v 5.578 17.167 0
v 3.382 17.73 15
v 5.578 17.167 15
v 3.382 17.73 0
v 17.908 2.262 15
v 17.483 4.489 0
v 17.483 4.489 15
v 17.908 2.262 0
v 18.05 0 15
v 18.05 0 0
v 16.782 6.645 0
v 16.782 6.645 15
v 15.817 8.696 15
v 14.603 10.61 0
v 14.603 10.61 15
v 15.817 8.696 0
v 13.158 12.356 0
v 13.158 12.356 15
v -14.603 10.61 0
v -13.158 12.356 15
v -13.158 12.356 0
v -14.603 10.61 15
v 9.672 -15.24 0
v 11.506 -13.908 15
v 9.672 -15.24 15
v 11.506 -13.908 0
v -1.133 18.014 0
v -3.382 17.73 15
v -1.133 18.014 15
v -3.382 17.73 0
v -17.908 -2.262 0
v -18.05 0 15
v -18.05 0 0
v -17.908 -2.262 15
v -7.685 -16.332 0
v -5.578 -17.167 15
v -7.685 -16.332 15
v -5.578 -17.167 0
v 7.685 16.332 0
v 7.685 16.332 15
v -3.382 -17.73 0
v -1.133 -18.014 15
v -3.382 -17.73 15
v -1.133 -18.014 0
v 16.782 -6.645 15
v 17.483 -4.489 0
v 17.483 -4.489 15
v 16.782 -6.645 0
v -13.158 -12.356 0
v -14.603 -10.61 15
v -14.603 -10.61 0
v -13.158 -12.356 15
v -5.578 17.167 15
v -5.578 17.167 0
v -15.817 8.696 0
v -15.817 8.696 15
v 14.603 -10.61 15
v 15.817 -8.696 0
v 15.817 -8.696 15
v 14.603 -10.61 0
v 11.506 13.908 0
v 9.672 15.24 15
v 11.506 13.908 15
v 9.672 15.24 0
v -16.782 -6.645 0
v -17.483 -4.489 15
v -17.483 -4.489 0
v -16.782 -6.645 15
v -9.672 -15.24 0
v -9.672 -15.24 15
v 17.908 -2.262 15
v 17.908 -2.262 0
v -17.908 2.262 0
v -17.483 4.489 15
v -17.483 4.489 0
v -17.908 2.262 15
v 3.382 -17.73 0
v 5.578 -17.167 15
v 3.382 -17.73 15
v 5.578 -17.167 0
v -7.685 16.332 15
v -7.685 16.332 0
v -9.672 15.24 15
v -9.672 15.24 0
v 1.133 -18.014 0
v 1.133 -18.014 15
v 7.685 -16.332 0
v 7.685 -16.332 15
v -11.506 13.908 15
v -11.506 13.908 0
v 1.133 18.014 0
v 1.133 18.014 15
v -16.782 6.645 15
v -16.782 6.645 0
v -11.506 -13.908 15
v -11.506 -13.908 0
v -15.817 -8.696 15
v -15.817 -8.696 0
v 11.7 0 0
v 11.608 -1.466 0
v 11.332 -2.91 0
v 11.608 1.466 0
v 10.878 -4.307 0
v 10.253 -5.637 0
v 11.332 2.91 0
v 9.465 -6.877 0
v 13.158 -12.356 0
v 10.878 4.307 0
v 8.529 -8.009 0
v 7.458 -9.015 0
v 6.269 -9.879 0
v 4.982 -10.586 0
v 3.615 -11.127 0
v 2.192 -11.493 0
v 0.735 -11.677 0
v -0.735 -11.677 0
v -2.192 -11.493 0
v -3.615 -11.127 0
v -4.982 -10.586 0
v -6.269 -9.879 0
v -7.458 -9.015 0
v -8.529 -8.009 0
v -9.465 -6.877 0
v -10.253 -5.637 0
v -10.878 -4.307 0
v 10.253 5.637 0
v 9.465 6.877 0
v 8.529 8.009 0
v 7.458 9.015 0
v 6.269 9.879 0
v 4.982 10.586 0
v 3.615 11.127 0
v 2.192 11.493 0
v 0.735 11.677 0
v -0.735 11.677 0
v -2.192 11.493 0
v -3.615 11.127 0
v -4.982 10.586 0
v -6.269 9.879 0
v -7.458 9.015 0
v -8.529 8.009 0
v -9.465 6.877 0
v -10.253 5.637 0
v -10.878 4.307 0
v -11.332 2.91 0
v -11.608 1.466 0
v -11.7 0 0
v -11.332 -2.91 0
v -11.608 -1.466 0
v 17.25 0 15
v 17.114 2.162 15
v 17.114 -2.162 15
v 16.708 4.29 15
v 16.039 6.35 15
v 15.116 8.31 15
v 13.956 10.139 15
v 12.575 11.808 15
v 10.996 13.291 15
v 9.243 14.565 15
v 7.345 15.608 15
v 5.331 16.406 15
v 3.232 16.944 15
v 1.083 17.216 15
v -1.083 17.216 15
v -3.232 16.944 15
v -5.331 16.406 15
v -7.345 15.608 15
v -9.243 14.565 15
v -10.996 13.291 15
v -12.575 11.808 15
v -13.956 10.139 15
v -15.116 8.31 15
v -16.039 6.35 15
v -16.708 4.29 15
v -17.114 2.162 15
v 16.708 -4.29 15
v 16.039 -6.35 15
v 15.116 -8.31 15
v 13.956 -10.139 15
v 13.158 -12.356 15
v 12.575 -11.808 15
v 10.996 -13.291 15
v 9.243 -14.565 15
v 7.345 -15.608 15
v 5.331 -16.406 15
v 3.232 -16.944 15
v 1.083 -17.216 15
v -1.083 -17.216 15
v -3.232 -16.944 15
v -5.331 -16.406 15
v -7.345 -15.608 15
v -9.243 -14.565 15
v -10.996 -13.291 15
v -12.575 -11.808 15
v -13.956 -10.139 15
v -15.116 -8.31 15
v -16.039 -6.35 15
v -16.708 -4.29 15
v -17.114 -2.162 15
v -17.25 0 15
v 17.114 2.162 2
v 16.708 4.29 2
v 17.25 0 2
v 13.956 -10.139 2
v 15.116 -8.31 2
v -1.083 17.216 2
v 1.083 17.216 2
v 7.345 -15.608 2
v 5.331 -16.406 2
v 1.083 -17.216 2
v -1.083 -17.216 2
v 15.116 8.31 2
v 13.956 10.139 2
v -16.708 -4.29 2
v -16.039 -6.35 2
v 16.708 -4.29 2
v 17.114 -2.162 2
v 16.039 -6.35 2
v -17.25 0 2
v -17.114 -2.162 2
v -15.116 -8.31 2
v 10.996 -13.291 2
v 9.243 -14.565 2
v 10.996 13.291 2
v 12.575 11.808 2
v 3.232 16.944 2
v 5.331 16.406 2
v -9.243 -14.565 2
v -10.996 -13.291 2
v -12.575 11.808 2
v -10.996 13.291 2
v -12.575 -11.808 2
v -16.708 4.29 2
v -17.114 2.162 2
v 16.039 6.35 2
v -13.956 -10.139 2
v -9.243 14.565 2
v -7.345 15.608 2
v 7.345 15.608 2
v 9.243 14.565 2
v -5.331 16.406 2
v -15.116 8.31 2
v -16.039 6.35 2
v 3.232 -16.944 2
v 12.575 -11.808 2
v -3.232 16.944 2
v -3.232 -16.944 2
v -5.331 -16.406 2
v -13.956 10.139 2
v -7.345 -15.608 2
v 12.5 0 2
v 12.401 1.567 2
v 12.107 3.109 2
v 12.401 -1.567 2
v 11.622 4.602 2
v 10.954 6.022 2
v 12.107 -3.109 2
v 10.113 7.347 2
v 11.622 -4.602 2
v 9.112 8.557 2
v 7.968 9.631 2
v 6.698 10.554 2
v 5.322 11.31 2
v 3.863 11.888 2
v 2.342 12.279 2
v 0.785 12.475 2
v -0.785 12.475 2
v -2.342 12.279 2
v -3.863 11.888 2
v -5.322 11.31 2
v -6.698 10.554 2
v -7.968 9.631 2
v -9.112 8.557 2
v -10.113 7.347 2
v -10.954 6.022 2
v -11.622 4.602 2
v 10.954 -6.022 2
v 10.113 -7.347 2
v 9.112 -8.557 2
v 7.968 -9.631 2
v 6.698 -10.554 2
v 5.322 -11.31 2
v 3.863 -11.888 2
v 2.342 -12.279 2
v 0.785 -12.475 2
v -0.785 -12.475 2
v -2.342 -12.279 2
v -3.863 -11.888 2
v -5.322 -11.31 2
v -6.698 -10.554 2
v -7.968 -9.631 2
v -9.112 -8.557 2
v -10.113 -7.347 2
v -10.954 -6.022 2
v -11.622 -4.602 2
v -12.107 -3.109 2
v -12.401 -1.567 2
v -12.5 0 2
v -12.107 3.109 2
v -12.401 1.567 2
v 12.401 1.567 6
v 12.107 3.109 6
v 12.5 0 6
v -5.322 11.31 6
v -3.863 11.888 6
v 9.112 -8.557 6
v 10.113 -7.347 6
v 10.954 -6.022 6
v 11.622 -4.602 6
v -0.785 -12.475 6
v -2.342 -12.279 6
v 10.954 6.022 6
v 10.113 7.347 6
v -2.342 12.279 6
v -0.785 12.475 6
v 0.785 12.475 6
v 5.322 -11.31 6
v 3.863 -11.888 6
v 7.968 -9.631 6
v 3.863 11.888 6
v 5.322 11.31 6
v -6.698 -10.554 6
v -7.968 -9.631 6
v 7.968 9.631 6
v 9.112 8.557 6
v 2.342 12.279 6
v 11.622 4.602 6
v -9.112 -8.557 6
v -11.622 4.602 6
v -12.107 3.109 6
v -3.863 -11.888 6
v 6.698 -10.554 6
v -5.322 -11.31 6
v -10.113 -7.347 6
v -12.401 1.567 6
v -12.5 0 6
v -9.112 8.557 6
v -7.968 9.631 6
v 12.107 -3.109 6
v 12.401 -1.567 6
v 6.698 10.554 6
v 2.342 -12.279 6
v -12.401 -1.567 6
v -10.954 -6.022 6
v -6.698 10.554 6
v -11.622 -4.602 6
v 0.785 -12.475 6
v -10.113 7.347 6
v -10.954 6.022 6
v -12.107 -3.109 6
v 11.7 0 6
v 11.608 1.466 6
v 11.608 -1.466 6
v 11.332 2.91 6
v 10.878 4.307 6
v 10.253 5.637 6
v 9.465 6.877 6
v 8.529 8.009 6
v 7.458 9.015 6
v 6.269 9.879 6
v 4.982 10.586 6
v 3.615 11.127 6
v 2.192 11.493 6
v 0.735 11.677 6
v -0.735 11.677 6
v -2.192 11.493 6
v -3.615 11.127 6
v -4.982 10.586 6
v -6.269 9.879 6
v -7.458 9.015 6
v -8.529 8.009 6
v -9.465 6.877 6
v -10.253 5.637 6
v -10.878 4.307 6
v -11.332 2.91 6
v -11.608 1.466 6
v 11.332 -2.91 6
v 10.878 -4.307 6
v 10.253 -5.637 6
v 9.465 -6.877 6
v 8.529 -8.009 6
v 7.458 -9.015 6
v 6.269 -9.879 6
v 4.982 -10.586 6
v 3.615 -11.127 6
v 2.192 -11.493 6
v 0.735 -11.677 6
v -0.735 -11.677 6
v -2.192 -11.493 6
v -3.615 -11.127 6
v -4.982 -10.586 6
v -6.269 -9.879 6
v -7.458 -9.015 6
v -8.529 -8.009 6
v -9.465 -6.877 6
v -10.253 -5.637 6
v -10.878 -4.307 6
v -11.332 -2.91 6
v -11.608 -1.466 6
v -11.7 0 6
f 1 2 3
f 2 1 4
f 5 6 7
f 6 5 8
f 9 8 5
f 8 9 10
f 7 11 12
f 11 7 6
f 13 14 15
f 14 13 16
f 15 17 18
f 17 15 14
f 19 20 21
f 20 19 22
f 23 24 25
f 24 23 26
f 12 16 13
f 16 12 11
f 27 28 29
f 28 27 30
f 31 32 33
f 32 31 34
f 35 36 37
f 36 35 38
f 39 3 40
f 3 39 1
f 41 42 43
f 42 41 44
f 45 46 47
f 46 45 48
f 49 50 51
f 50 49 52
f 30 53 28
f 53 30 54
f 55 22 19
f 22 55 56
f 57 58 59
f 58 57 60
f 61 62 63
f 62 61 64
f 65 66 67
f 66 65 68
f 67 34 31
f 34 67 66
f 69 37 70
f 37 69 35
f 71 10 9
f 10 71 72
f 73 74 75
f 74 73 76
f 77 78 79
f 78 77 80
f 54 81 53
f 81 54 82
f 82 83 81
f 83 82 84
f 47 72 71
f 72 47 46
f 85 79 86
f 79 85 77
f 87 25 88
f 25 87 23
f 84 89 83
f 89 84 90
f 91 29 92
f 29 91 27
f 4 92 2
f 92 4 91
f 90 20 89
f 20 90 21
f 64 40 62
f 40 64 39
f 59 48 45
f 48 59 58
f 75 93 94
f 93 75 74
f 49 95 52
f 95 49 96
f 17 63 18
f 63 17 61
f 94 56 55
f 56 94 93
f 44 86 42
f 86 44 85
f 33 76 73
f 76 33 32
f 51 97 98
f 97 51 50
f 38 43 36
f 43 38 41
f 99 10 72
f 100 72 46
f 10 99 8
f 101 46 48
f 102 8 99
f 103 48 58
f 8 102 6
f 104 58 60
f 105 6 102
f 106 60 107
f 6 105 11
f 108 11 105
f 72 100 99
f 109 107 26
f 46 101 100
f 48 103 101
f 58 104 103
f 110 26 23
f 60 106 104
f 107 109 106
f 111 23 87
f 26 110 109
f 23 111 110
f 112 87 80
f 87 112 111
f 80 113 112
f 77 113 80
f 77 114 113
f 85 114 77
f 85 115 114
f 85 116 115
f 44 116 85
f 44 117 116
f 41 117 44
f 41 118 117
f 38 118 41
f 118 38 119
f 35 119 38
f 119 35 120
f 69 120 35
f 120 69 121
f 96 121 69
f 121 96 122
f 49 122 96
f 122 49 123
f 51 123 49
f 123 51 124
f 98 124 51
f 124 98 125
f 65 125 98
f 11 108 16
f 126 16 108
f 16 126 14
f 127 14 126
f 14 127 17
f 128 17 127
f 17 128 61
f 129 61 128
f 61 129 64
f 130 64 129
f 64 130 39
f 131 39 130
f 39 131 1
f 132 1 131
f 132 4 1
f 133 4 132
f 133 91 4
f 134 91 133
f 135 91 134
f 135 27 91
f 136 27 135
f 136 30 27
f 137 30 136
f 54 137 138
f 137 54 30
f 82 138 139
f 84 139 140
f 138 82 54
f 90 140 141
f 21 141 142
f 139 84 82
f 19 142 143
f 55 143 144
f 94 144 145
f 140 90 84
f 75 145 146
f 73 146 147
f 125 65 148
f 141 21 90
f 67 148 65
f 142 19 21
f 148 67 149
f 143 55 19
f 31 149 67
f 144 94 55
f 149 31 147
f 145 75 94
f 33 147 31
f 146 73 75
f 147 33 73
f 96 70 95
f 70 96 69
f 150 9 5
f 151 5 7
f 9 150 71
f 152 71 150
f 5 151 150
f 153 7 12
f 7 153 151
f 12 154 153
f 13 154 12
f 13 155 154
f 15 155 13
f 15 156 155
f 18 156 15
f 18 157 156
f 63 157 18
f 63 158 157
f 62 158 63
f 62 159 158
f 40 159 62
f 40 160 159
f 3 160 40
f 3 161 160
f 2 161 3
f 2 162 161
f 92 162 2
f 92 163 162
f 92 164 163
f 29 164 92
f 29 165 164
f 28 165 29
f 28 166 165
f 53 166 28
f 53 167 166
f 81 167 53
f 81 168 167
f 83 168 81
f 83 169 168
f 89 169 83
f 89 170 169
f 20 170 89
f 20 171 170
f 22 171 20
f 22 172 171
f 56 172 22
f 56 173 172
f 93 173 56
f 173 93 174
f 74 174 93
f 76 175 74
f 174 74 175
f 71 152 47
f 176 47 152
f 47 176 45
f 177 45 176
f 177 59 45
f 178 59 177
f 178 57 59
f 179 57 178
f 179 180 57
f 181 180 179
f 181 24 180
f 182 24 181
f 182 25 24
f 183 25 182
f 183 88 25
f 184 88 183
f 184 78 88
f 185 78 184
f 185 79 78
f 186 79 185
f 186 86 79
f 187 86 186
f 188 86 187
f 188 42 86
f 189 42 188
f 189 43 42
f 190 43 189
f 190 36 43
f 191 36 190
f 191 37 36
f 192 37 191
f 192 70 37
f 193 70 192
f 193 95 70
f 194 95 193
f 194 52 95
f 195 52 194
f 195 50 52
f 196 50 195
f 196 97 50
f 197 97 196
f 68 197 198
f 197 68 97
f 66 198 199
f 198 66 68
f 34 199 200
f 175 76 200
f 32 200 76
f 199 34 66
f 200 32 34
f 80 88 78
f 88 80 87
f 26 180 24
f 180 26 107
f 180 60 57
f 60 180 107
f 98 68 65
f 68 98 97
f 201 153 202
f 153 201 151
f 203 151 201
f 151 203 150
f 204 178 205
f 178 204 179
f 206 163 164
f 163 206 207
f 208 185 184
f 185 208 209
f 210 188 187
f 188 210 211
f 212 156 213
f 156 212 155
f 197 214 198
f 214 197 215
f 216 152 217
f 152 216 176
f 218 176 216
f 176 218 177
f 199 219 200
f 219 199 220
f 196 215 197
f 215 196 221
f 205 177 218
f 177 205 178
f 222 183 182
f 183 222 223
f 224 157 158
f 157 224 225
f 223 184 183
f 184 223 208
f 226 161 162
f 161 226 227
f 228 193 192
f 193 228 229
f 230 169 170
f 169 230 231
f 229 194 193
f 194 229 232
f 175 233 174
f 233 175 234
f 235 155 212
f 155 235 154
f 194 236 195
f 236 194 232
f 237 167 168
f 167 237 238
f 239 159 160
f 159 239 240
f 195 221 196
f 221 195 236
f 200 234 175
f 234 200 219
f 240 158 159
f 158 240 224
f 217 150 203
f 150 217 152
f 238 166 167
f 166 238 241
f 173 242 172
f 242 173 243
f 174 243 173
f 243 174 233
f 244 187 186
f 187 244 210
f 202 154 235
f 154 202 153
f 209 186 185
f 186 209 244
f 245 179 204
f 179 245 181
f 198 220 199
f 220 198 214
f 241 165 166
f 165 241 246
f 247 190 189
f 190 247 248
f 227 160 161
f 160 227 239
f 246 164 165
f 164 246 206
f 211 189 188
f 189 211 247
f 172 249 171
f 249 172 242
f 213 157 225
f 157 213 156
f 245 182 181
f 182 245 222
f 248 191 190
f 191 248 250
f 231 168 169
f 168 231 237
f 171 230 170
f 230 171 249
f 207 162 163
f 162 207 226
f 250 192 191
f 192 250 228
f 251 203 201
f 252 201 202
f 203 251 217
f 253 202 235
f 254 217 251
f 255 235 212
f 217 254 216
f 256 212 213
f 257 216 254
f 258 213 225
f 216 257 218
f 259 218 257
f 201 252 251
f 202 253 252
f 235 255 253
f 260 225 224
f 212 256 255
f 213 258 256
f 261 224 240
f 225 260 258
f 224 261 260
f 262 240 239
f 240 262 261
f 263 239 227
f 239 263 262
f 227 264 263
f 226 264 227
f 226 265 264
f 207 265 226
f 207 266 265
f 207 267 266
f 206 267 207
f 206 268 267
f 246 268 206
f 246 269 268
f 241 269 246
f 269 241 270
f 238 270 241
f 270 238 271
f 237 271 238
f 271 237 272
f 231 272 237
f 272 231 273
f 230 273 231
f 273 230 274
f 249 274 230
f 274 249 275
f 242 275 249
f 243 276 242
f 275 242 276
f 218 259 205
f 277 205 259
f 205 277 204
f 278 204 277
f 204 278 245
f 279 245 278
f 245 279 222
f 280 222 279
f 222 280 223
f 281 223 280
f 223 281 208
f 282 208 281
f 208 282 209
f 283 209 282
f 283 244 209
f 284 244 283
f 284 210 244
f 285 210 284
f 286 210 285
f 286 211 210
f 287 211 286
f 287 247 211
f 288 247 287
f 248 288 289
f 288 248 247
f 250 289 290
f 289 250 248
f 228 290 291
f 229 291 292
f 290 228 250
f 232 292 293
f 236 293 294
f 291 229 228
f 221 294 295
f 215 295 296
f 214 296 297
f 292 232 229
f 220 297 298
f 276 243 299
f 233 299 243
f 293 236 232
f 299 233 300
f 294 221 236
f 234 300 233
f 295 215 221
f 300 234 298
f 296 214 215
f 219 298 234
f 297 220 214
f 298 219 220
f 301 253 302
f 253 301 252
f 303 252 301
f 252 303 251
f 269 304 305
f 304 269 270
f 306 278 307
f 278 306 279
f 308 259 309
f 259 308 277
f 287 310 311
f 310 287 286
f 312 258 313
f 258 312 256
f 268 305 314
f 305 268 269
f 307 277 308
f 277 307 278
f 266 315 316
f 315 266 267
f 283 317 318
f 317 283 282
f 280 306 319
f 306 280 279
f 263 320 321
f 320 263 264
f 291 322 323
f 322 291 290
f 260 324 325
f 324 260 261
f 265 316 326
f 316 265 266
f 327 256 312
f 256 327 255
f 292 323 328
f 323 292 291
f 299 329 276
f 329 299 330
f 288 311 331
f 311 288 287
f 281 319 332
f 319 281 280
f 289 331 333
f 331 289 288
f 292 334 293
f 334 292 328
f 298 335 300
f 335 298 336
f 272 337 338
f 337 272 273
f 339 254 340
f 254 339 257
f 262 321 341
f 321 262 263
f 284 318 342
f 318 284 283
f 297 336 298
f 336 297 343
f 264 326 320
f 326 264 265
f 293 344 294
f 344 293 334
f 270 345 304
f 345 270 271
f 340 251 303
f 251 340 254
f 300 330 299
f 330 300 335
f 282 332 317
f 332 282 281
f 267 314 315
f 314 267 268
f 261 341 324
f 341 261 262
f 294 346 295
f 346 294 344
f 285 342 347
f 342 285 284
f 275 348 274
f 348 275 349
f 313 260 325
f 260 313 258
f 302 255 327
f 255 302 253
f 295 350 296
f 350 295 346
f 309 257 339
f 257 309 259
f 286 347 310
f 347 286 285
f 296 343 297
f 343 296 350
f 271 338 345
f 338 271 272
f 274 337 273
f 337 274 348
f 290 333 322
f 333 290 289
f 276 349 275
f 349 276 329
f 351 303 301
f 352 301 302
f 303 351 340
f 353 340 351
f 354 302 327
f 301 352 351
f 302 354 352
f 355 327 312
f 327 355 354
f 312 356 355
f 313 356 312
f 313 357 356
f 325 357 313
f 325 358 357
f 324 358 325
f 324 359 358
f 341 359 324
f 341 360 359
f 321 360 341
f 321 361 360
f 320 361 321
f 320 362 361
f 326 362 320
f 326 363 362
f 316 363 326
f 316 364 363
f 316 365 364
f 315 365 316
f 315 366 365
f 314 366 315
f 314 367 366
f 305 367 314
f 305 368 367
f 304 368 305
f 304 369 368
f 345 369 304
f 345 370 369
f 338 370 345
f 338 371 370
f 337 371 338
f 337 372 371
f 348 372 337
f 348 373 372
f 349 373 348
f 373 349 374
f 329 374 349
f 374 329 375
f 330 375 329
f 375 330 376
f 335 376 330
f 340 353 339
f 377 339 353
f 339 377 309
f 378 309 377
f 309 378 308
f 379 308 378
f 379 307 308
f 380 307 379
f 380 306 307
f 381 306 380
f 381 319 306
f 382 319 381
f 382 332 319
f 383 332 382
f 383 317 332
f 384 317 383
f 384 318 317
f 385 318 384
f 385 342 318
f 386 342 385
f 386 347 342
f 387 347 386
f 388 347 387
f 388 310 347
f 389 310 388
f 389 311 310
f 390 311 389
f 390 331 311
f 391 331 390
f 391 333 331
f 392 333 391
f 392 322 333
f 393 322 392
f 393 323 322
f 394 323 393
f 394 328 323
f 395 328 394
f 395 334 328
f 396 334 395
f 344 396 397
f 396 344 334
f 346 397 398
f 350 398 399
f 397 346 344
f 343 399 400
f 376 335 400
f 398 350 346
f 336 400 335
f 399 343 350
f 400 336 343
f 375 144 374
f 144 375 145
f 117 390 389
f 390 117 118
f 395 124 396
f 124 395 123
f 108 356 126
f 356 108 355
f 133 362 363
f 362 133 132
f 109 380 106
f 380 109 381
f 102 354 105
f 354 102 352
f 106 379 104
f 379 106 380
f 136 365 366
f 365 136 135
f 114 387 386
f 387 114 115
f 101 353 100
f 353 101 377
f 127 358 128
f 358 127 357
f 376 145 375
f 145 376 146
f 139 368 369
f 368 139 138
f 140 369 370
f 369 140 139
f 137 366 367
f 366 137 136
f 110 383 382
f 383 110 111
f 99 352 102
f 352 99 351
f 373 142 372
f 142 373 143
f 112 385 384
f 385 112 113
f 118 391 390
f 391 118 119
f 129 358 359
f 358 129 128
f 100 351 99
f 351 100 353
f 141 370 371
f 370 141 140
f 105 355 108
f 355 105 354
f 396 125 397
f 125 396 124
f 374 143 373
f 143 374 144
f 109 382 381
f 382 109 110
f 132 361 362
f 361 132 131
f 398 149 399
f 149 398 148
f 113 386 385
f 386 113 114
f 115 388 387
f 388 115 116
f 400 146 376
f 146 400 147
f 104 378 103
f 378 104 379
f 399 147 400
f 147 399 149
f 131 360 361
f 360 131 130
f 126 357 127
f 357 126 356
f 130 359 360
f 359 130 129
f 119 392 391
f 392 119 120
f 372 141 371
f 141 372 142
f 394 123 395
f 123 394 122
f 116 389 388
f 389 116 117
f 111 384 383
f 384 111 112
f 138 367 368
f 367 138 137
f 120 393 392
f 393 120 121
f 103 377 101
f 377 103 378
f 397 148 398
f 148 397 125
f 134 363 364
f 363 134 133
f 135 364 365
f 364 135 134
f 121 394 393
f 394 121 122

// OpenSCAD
$fn=50;

thickness = 1.6;
outer_d = 34.5;
inner_d = 25;

difference() {
  union() {
    difference() {
        cylinder(15, d=outer_d + thickness);
        translate([0,0,2])
        cylinder(15, d=outer_d);
    }
    translate([0,0,2])
    cylinder(4, d=inner_d);
  }
  cylinder(15, d=inner_d - thickness);
}
